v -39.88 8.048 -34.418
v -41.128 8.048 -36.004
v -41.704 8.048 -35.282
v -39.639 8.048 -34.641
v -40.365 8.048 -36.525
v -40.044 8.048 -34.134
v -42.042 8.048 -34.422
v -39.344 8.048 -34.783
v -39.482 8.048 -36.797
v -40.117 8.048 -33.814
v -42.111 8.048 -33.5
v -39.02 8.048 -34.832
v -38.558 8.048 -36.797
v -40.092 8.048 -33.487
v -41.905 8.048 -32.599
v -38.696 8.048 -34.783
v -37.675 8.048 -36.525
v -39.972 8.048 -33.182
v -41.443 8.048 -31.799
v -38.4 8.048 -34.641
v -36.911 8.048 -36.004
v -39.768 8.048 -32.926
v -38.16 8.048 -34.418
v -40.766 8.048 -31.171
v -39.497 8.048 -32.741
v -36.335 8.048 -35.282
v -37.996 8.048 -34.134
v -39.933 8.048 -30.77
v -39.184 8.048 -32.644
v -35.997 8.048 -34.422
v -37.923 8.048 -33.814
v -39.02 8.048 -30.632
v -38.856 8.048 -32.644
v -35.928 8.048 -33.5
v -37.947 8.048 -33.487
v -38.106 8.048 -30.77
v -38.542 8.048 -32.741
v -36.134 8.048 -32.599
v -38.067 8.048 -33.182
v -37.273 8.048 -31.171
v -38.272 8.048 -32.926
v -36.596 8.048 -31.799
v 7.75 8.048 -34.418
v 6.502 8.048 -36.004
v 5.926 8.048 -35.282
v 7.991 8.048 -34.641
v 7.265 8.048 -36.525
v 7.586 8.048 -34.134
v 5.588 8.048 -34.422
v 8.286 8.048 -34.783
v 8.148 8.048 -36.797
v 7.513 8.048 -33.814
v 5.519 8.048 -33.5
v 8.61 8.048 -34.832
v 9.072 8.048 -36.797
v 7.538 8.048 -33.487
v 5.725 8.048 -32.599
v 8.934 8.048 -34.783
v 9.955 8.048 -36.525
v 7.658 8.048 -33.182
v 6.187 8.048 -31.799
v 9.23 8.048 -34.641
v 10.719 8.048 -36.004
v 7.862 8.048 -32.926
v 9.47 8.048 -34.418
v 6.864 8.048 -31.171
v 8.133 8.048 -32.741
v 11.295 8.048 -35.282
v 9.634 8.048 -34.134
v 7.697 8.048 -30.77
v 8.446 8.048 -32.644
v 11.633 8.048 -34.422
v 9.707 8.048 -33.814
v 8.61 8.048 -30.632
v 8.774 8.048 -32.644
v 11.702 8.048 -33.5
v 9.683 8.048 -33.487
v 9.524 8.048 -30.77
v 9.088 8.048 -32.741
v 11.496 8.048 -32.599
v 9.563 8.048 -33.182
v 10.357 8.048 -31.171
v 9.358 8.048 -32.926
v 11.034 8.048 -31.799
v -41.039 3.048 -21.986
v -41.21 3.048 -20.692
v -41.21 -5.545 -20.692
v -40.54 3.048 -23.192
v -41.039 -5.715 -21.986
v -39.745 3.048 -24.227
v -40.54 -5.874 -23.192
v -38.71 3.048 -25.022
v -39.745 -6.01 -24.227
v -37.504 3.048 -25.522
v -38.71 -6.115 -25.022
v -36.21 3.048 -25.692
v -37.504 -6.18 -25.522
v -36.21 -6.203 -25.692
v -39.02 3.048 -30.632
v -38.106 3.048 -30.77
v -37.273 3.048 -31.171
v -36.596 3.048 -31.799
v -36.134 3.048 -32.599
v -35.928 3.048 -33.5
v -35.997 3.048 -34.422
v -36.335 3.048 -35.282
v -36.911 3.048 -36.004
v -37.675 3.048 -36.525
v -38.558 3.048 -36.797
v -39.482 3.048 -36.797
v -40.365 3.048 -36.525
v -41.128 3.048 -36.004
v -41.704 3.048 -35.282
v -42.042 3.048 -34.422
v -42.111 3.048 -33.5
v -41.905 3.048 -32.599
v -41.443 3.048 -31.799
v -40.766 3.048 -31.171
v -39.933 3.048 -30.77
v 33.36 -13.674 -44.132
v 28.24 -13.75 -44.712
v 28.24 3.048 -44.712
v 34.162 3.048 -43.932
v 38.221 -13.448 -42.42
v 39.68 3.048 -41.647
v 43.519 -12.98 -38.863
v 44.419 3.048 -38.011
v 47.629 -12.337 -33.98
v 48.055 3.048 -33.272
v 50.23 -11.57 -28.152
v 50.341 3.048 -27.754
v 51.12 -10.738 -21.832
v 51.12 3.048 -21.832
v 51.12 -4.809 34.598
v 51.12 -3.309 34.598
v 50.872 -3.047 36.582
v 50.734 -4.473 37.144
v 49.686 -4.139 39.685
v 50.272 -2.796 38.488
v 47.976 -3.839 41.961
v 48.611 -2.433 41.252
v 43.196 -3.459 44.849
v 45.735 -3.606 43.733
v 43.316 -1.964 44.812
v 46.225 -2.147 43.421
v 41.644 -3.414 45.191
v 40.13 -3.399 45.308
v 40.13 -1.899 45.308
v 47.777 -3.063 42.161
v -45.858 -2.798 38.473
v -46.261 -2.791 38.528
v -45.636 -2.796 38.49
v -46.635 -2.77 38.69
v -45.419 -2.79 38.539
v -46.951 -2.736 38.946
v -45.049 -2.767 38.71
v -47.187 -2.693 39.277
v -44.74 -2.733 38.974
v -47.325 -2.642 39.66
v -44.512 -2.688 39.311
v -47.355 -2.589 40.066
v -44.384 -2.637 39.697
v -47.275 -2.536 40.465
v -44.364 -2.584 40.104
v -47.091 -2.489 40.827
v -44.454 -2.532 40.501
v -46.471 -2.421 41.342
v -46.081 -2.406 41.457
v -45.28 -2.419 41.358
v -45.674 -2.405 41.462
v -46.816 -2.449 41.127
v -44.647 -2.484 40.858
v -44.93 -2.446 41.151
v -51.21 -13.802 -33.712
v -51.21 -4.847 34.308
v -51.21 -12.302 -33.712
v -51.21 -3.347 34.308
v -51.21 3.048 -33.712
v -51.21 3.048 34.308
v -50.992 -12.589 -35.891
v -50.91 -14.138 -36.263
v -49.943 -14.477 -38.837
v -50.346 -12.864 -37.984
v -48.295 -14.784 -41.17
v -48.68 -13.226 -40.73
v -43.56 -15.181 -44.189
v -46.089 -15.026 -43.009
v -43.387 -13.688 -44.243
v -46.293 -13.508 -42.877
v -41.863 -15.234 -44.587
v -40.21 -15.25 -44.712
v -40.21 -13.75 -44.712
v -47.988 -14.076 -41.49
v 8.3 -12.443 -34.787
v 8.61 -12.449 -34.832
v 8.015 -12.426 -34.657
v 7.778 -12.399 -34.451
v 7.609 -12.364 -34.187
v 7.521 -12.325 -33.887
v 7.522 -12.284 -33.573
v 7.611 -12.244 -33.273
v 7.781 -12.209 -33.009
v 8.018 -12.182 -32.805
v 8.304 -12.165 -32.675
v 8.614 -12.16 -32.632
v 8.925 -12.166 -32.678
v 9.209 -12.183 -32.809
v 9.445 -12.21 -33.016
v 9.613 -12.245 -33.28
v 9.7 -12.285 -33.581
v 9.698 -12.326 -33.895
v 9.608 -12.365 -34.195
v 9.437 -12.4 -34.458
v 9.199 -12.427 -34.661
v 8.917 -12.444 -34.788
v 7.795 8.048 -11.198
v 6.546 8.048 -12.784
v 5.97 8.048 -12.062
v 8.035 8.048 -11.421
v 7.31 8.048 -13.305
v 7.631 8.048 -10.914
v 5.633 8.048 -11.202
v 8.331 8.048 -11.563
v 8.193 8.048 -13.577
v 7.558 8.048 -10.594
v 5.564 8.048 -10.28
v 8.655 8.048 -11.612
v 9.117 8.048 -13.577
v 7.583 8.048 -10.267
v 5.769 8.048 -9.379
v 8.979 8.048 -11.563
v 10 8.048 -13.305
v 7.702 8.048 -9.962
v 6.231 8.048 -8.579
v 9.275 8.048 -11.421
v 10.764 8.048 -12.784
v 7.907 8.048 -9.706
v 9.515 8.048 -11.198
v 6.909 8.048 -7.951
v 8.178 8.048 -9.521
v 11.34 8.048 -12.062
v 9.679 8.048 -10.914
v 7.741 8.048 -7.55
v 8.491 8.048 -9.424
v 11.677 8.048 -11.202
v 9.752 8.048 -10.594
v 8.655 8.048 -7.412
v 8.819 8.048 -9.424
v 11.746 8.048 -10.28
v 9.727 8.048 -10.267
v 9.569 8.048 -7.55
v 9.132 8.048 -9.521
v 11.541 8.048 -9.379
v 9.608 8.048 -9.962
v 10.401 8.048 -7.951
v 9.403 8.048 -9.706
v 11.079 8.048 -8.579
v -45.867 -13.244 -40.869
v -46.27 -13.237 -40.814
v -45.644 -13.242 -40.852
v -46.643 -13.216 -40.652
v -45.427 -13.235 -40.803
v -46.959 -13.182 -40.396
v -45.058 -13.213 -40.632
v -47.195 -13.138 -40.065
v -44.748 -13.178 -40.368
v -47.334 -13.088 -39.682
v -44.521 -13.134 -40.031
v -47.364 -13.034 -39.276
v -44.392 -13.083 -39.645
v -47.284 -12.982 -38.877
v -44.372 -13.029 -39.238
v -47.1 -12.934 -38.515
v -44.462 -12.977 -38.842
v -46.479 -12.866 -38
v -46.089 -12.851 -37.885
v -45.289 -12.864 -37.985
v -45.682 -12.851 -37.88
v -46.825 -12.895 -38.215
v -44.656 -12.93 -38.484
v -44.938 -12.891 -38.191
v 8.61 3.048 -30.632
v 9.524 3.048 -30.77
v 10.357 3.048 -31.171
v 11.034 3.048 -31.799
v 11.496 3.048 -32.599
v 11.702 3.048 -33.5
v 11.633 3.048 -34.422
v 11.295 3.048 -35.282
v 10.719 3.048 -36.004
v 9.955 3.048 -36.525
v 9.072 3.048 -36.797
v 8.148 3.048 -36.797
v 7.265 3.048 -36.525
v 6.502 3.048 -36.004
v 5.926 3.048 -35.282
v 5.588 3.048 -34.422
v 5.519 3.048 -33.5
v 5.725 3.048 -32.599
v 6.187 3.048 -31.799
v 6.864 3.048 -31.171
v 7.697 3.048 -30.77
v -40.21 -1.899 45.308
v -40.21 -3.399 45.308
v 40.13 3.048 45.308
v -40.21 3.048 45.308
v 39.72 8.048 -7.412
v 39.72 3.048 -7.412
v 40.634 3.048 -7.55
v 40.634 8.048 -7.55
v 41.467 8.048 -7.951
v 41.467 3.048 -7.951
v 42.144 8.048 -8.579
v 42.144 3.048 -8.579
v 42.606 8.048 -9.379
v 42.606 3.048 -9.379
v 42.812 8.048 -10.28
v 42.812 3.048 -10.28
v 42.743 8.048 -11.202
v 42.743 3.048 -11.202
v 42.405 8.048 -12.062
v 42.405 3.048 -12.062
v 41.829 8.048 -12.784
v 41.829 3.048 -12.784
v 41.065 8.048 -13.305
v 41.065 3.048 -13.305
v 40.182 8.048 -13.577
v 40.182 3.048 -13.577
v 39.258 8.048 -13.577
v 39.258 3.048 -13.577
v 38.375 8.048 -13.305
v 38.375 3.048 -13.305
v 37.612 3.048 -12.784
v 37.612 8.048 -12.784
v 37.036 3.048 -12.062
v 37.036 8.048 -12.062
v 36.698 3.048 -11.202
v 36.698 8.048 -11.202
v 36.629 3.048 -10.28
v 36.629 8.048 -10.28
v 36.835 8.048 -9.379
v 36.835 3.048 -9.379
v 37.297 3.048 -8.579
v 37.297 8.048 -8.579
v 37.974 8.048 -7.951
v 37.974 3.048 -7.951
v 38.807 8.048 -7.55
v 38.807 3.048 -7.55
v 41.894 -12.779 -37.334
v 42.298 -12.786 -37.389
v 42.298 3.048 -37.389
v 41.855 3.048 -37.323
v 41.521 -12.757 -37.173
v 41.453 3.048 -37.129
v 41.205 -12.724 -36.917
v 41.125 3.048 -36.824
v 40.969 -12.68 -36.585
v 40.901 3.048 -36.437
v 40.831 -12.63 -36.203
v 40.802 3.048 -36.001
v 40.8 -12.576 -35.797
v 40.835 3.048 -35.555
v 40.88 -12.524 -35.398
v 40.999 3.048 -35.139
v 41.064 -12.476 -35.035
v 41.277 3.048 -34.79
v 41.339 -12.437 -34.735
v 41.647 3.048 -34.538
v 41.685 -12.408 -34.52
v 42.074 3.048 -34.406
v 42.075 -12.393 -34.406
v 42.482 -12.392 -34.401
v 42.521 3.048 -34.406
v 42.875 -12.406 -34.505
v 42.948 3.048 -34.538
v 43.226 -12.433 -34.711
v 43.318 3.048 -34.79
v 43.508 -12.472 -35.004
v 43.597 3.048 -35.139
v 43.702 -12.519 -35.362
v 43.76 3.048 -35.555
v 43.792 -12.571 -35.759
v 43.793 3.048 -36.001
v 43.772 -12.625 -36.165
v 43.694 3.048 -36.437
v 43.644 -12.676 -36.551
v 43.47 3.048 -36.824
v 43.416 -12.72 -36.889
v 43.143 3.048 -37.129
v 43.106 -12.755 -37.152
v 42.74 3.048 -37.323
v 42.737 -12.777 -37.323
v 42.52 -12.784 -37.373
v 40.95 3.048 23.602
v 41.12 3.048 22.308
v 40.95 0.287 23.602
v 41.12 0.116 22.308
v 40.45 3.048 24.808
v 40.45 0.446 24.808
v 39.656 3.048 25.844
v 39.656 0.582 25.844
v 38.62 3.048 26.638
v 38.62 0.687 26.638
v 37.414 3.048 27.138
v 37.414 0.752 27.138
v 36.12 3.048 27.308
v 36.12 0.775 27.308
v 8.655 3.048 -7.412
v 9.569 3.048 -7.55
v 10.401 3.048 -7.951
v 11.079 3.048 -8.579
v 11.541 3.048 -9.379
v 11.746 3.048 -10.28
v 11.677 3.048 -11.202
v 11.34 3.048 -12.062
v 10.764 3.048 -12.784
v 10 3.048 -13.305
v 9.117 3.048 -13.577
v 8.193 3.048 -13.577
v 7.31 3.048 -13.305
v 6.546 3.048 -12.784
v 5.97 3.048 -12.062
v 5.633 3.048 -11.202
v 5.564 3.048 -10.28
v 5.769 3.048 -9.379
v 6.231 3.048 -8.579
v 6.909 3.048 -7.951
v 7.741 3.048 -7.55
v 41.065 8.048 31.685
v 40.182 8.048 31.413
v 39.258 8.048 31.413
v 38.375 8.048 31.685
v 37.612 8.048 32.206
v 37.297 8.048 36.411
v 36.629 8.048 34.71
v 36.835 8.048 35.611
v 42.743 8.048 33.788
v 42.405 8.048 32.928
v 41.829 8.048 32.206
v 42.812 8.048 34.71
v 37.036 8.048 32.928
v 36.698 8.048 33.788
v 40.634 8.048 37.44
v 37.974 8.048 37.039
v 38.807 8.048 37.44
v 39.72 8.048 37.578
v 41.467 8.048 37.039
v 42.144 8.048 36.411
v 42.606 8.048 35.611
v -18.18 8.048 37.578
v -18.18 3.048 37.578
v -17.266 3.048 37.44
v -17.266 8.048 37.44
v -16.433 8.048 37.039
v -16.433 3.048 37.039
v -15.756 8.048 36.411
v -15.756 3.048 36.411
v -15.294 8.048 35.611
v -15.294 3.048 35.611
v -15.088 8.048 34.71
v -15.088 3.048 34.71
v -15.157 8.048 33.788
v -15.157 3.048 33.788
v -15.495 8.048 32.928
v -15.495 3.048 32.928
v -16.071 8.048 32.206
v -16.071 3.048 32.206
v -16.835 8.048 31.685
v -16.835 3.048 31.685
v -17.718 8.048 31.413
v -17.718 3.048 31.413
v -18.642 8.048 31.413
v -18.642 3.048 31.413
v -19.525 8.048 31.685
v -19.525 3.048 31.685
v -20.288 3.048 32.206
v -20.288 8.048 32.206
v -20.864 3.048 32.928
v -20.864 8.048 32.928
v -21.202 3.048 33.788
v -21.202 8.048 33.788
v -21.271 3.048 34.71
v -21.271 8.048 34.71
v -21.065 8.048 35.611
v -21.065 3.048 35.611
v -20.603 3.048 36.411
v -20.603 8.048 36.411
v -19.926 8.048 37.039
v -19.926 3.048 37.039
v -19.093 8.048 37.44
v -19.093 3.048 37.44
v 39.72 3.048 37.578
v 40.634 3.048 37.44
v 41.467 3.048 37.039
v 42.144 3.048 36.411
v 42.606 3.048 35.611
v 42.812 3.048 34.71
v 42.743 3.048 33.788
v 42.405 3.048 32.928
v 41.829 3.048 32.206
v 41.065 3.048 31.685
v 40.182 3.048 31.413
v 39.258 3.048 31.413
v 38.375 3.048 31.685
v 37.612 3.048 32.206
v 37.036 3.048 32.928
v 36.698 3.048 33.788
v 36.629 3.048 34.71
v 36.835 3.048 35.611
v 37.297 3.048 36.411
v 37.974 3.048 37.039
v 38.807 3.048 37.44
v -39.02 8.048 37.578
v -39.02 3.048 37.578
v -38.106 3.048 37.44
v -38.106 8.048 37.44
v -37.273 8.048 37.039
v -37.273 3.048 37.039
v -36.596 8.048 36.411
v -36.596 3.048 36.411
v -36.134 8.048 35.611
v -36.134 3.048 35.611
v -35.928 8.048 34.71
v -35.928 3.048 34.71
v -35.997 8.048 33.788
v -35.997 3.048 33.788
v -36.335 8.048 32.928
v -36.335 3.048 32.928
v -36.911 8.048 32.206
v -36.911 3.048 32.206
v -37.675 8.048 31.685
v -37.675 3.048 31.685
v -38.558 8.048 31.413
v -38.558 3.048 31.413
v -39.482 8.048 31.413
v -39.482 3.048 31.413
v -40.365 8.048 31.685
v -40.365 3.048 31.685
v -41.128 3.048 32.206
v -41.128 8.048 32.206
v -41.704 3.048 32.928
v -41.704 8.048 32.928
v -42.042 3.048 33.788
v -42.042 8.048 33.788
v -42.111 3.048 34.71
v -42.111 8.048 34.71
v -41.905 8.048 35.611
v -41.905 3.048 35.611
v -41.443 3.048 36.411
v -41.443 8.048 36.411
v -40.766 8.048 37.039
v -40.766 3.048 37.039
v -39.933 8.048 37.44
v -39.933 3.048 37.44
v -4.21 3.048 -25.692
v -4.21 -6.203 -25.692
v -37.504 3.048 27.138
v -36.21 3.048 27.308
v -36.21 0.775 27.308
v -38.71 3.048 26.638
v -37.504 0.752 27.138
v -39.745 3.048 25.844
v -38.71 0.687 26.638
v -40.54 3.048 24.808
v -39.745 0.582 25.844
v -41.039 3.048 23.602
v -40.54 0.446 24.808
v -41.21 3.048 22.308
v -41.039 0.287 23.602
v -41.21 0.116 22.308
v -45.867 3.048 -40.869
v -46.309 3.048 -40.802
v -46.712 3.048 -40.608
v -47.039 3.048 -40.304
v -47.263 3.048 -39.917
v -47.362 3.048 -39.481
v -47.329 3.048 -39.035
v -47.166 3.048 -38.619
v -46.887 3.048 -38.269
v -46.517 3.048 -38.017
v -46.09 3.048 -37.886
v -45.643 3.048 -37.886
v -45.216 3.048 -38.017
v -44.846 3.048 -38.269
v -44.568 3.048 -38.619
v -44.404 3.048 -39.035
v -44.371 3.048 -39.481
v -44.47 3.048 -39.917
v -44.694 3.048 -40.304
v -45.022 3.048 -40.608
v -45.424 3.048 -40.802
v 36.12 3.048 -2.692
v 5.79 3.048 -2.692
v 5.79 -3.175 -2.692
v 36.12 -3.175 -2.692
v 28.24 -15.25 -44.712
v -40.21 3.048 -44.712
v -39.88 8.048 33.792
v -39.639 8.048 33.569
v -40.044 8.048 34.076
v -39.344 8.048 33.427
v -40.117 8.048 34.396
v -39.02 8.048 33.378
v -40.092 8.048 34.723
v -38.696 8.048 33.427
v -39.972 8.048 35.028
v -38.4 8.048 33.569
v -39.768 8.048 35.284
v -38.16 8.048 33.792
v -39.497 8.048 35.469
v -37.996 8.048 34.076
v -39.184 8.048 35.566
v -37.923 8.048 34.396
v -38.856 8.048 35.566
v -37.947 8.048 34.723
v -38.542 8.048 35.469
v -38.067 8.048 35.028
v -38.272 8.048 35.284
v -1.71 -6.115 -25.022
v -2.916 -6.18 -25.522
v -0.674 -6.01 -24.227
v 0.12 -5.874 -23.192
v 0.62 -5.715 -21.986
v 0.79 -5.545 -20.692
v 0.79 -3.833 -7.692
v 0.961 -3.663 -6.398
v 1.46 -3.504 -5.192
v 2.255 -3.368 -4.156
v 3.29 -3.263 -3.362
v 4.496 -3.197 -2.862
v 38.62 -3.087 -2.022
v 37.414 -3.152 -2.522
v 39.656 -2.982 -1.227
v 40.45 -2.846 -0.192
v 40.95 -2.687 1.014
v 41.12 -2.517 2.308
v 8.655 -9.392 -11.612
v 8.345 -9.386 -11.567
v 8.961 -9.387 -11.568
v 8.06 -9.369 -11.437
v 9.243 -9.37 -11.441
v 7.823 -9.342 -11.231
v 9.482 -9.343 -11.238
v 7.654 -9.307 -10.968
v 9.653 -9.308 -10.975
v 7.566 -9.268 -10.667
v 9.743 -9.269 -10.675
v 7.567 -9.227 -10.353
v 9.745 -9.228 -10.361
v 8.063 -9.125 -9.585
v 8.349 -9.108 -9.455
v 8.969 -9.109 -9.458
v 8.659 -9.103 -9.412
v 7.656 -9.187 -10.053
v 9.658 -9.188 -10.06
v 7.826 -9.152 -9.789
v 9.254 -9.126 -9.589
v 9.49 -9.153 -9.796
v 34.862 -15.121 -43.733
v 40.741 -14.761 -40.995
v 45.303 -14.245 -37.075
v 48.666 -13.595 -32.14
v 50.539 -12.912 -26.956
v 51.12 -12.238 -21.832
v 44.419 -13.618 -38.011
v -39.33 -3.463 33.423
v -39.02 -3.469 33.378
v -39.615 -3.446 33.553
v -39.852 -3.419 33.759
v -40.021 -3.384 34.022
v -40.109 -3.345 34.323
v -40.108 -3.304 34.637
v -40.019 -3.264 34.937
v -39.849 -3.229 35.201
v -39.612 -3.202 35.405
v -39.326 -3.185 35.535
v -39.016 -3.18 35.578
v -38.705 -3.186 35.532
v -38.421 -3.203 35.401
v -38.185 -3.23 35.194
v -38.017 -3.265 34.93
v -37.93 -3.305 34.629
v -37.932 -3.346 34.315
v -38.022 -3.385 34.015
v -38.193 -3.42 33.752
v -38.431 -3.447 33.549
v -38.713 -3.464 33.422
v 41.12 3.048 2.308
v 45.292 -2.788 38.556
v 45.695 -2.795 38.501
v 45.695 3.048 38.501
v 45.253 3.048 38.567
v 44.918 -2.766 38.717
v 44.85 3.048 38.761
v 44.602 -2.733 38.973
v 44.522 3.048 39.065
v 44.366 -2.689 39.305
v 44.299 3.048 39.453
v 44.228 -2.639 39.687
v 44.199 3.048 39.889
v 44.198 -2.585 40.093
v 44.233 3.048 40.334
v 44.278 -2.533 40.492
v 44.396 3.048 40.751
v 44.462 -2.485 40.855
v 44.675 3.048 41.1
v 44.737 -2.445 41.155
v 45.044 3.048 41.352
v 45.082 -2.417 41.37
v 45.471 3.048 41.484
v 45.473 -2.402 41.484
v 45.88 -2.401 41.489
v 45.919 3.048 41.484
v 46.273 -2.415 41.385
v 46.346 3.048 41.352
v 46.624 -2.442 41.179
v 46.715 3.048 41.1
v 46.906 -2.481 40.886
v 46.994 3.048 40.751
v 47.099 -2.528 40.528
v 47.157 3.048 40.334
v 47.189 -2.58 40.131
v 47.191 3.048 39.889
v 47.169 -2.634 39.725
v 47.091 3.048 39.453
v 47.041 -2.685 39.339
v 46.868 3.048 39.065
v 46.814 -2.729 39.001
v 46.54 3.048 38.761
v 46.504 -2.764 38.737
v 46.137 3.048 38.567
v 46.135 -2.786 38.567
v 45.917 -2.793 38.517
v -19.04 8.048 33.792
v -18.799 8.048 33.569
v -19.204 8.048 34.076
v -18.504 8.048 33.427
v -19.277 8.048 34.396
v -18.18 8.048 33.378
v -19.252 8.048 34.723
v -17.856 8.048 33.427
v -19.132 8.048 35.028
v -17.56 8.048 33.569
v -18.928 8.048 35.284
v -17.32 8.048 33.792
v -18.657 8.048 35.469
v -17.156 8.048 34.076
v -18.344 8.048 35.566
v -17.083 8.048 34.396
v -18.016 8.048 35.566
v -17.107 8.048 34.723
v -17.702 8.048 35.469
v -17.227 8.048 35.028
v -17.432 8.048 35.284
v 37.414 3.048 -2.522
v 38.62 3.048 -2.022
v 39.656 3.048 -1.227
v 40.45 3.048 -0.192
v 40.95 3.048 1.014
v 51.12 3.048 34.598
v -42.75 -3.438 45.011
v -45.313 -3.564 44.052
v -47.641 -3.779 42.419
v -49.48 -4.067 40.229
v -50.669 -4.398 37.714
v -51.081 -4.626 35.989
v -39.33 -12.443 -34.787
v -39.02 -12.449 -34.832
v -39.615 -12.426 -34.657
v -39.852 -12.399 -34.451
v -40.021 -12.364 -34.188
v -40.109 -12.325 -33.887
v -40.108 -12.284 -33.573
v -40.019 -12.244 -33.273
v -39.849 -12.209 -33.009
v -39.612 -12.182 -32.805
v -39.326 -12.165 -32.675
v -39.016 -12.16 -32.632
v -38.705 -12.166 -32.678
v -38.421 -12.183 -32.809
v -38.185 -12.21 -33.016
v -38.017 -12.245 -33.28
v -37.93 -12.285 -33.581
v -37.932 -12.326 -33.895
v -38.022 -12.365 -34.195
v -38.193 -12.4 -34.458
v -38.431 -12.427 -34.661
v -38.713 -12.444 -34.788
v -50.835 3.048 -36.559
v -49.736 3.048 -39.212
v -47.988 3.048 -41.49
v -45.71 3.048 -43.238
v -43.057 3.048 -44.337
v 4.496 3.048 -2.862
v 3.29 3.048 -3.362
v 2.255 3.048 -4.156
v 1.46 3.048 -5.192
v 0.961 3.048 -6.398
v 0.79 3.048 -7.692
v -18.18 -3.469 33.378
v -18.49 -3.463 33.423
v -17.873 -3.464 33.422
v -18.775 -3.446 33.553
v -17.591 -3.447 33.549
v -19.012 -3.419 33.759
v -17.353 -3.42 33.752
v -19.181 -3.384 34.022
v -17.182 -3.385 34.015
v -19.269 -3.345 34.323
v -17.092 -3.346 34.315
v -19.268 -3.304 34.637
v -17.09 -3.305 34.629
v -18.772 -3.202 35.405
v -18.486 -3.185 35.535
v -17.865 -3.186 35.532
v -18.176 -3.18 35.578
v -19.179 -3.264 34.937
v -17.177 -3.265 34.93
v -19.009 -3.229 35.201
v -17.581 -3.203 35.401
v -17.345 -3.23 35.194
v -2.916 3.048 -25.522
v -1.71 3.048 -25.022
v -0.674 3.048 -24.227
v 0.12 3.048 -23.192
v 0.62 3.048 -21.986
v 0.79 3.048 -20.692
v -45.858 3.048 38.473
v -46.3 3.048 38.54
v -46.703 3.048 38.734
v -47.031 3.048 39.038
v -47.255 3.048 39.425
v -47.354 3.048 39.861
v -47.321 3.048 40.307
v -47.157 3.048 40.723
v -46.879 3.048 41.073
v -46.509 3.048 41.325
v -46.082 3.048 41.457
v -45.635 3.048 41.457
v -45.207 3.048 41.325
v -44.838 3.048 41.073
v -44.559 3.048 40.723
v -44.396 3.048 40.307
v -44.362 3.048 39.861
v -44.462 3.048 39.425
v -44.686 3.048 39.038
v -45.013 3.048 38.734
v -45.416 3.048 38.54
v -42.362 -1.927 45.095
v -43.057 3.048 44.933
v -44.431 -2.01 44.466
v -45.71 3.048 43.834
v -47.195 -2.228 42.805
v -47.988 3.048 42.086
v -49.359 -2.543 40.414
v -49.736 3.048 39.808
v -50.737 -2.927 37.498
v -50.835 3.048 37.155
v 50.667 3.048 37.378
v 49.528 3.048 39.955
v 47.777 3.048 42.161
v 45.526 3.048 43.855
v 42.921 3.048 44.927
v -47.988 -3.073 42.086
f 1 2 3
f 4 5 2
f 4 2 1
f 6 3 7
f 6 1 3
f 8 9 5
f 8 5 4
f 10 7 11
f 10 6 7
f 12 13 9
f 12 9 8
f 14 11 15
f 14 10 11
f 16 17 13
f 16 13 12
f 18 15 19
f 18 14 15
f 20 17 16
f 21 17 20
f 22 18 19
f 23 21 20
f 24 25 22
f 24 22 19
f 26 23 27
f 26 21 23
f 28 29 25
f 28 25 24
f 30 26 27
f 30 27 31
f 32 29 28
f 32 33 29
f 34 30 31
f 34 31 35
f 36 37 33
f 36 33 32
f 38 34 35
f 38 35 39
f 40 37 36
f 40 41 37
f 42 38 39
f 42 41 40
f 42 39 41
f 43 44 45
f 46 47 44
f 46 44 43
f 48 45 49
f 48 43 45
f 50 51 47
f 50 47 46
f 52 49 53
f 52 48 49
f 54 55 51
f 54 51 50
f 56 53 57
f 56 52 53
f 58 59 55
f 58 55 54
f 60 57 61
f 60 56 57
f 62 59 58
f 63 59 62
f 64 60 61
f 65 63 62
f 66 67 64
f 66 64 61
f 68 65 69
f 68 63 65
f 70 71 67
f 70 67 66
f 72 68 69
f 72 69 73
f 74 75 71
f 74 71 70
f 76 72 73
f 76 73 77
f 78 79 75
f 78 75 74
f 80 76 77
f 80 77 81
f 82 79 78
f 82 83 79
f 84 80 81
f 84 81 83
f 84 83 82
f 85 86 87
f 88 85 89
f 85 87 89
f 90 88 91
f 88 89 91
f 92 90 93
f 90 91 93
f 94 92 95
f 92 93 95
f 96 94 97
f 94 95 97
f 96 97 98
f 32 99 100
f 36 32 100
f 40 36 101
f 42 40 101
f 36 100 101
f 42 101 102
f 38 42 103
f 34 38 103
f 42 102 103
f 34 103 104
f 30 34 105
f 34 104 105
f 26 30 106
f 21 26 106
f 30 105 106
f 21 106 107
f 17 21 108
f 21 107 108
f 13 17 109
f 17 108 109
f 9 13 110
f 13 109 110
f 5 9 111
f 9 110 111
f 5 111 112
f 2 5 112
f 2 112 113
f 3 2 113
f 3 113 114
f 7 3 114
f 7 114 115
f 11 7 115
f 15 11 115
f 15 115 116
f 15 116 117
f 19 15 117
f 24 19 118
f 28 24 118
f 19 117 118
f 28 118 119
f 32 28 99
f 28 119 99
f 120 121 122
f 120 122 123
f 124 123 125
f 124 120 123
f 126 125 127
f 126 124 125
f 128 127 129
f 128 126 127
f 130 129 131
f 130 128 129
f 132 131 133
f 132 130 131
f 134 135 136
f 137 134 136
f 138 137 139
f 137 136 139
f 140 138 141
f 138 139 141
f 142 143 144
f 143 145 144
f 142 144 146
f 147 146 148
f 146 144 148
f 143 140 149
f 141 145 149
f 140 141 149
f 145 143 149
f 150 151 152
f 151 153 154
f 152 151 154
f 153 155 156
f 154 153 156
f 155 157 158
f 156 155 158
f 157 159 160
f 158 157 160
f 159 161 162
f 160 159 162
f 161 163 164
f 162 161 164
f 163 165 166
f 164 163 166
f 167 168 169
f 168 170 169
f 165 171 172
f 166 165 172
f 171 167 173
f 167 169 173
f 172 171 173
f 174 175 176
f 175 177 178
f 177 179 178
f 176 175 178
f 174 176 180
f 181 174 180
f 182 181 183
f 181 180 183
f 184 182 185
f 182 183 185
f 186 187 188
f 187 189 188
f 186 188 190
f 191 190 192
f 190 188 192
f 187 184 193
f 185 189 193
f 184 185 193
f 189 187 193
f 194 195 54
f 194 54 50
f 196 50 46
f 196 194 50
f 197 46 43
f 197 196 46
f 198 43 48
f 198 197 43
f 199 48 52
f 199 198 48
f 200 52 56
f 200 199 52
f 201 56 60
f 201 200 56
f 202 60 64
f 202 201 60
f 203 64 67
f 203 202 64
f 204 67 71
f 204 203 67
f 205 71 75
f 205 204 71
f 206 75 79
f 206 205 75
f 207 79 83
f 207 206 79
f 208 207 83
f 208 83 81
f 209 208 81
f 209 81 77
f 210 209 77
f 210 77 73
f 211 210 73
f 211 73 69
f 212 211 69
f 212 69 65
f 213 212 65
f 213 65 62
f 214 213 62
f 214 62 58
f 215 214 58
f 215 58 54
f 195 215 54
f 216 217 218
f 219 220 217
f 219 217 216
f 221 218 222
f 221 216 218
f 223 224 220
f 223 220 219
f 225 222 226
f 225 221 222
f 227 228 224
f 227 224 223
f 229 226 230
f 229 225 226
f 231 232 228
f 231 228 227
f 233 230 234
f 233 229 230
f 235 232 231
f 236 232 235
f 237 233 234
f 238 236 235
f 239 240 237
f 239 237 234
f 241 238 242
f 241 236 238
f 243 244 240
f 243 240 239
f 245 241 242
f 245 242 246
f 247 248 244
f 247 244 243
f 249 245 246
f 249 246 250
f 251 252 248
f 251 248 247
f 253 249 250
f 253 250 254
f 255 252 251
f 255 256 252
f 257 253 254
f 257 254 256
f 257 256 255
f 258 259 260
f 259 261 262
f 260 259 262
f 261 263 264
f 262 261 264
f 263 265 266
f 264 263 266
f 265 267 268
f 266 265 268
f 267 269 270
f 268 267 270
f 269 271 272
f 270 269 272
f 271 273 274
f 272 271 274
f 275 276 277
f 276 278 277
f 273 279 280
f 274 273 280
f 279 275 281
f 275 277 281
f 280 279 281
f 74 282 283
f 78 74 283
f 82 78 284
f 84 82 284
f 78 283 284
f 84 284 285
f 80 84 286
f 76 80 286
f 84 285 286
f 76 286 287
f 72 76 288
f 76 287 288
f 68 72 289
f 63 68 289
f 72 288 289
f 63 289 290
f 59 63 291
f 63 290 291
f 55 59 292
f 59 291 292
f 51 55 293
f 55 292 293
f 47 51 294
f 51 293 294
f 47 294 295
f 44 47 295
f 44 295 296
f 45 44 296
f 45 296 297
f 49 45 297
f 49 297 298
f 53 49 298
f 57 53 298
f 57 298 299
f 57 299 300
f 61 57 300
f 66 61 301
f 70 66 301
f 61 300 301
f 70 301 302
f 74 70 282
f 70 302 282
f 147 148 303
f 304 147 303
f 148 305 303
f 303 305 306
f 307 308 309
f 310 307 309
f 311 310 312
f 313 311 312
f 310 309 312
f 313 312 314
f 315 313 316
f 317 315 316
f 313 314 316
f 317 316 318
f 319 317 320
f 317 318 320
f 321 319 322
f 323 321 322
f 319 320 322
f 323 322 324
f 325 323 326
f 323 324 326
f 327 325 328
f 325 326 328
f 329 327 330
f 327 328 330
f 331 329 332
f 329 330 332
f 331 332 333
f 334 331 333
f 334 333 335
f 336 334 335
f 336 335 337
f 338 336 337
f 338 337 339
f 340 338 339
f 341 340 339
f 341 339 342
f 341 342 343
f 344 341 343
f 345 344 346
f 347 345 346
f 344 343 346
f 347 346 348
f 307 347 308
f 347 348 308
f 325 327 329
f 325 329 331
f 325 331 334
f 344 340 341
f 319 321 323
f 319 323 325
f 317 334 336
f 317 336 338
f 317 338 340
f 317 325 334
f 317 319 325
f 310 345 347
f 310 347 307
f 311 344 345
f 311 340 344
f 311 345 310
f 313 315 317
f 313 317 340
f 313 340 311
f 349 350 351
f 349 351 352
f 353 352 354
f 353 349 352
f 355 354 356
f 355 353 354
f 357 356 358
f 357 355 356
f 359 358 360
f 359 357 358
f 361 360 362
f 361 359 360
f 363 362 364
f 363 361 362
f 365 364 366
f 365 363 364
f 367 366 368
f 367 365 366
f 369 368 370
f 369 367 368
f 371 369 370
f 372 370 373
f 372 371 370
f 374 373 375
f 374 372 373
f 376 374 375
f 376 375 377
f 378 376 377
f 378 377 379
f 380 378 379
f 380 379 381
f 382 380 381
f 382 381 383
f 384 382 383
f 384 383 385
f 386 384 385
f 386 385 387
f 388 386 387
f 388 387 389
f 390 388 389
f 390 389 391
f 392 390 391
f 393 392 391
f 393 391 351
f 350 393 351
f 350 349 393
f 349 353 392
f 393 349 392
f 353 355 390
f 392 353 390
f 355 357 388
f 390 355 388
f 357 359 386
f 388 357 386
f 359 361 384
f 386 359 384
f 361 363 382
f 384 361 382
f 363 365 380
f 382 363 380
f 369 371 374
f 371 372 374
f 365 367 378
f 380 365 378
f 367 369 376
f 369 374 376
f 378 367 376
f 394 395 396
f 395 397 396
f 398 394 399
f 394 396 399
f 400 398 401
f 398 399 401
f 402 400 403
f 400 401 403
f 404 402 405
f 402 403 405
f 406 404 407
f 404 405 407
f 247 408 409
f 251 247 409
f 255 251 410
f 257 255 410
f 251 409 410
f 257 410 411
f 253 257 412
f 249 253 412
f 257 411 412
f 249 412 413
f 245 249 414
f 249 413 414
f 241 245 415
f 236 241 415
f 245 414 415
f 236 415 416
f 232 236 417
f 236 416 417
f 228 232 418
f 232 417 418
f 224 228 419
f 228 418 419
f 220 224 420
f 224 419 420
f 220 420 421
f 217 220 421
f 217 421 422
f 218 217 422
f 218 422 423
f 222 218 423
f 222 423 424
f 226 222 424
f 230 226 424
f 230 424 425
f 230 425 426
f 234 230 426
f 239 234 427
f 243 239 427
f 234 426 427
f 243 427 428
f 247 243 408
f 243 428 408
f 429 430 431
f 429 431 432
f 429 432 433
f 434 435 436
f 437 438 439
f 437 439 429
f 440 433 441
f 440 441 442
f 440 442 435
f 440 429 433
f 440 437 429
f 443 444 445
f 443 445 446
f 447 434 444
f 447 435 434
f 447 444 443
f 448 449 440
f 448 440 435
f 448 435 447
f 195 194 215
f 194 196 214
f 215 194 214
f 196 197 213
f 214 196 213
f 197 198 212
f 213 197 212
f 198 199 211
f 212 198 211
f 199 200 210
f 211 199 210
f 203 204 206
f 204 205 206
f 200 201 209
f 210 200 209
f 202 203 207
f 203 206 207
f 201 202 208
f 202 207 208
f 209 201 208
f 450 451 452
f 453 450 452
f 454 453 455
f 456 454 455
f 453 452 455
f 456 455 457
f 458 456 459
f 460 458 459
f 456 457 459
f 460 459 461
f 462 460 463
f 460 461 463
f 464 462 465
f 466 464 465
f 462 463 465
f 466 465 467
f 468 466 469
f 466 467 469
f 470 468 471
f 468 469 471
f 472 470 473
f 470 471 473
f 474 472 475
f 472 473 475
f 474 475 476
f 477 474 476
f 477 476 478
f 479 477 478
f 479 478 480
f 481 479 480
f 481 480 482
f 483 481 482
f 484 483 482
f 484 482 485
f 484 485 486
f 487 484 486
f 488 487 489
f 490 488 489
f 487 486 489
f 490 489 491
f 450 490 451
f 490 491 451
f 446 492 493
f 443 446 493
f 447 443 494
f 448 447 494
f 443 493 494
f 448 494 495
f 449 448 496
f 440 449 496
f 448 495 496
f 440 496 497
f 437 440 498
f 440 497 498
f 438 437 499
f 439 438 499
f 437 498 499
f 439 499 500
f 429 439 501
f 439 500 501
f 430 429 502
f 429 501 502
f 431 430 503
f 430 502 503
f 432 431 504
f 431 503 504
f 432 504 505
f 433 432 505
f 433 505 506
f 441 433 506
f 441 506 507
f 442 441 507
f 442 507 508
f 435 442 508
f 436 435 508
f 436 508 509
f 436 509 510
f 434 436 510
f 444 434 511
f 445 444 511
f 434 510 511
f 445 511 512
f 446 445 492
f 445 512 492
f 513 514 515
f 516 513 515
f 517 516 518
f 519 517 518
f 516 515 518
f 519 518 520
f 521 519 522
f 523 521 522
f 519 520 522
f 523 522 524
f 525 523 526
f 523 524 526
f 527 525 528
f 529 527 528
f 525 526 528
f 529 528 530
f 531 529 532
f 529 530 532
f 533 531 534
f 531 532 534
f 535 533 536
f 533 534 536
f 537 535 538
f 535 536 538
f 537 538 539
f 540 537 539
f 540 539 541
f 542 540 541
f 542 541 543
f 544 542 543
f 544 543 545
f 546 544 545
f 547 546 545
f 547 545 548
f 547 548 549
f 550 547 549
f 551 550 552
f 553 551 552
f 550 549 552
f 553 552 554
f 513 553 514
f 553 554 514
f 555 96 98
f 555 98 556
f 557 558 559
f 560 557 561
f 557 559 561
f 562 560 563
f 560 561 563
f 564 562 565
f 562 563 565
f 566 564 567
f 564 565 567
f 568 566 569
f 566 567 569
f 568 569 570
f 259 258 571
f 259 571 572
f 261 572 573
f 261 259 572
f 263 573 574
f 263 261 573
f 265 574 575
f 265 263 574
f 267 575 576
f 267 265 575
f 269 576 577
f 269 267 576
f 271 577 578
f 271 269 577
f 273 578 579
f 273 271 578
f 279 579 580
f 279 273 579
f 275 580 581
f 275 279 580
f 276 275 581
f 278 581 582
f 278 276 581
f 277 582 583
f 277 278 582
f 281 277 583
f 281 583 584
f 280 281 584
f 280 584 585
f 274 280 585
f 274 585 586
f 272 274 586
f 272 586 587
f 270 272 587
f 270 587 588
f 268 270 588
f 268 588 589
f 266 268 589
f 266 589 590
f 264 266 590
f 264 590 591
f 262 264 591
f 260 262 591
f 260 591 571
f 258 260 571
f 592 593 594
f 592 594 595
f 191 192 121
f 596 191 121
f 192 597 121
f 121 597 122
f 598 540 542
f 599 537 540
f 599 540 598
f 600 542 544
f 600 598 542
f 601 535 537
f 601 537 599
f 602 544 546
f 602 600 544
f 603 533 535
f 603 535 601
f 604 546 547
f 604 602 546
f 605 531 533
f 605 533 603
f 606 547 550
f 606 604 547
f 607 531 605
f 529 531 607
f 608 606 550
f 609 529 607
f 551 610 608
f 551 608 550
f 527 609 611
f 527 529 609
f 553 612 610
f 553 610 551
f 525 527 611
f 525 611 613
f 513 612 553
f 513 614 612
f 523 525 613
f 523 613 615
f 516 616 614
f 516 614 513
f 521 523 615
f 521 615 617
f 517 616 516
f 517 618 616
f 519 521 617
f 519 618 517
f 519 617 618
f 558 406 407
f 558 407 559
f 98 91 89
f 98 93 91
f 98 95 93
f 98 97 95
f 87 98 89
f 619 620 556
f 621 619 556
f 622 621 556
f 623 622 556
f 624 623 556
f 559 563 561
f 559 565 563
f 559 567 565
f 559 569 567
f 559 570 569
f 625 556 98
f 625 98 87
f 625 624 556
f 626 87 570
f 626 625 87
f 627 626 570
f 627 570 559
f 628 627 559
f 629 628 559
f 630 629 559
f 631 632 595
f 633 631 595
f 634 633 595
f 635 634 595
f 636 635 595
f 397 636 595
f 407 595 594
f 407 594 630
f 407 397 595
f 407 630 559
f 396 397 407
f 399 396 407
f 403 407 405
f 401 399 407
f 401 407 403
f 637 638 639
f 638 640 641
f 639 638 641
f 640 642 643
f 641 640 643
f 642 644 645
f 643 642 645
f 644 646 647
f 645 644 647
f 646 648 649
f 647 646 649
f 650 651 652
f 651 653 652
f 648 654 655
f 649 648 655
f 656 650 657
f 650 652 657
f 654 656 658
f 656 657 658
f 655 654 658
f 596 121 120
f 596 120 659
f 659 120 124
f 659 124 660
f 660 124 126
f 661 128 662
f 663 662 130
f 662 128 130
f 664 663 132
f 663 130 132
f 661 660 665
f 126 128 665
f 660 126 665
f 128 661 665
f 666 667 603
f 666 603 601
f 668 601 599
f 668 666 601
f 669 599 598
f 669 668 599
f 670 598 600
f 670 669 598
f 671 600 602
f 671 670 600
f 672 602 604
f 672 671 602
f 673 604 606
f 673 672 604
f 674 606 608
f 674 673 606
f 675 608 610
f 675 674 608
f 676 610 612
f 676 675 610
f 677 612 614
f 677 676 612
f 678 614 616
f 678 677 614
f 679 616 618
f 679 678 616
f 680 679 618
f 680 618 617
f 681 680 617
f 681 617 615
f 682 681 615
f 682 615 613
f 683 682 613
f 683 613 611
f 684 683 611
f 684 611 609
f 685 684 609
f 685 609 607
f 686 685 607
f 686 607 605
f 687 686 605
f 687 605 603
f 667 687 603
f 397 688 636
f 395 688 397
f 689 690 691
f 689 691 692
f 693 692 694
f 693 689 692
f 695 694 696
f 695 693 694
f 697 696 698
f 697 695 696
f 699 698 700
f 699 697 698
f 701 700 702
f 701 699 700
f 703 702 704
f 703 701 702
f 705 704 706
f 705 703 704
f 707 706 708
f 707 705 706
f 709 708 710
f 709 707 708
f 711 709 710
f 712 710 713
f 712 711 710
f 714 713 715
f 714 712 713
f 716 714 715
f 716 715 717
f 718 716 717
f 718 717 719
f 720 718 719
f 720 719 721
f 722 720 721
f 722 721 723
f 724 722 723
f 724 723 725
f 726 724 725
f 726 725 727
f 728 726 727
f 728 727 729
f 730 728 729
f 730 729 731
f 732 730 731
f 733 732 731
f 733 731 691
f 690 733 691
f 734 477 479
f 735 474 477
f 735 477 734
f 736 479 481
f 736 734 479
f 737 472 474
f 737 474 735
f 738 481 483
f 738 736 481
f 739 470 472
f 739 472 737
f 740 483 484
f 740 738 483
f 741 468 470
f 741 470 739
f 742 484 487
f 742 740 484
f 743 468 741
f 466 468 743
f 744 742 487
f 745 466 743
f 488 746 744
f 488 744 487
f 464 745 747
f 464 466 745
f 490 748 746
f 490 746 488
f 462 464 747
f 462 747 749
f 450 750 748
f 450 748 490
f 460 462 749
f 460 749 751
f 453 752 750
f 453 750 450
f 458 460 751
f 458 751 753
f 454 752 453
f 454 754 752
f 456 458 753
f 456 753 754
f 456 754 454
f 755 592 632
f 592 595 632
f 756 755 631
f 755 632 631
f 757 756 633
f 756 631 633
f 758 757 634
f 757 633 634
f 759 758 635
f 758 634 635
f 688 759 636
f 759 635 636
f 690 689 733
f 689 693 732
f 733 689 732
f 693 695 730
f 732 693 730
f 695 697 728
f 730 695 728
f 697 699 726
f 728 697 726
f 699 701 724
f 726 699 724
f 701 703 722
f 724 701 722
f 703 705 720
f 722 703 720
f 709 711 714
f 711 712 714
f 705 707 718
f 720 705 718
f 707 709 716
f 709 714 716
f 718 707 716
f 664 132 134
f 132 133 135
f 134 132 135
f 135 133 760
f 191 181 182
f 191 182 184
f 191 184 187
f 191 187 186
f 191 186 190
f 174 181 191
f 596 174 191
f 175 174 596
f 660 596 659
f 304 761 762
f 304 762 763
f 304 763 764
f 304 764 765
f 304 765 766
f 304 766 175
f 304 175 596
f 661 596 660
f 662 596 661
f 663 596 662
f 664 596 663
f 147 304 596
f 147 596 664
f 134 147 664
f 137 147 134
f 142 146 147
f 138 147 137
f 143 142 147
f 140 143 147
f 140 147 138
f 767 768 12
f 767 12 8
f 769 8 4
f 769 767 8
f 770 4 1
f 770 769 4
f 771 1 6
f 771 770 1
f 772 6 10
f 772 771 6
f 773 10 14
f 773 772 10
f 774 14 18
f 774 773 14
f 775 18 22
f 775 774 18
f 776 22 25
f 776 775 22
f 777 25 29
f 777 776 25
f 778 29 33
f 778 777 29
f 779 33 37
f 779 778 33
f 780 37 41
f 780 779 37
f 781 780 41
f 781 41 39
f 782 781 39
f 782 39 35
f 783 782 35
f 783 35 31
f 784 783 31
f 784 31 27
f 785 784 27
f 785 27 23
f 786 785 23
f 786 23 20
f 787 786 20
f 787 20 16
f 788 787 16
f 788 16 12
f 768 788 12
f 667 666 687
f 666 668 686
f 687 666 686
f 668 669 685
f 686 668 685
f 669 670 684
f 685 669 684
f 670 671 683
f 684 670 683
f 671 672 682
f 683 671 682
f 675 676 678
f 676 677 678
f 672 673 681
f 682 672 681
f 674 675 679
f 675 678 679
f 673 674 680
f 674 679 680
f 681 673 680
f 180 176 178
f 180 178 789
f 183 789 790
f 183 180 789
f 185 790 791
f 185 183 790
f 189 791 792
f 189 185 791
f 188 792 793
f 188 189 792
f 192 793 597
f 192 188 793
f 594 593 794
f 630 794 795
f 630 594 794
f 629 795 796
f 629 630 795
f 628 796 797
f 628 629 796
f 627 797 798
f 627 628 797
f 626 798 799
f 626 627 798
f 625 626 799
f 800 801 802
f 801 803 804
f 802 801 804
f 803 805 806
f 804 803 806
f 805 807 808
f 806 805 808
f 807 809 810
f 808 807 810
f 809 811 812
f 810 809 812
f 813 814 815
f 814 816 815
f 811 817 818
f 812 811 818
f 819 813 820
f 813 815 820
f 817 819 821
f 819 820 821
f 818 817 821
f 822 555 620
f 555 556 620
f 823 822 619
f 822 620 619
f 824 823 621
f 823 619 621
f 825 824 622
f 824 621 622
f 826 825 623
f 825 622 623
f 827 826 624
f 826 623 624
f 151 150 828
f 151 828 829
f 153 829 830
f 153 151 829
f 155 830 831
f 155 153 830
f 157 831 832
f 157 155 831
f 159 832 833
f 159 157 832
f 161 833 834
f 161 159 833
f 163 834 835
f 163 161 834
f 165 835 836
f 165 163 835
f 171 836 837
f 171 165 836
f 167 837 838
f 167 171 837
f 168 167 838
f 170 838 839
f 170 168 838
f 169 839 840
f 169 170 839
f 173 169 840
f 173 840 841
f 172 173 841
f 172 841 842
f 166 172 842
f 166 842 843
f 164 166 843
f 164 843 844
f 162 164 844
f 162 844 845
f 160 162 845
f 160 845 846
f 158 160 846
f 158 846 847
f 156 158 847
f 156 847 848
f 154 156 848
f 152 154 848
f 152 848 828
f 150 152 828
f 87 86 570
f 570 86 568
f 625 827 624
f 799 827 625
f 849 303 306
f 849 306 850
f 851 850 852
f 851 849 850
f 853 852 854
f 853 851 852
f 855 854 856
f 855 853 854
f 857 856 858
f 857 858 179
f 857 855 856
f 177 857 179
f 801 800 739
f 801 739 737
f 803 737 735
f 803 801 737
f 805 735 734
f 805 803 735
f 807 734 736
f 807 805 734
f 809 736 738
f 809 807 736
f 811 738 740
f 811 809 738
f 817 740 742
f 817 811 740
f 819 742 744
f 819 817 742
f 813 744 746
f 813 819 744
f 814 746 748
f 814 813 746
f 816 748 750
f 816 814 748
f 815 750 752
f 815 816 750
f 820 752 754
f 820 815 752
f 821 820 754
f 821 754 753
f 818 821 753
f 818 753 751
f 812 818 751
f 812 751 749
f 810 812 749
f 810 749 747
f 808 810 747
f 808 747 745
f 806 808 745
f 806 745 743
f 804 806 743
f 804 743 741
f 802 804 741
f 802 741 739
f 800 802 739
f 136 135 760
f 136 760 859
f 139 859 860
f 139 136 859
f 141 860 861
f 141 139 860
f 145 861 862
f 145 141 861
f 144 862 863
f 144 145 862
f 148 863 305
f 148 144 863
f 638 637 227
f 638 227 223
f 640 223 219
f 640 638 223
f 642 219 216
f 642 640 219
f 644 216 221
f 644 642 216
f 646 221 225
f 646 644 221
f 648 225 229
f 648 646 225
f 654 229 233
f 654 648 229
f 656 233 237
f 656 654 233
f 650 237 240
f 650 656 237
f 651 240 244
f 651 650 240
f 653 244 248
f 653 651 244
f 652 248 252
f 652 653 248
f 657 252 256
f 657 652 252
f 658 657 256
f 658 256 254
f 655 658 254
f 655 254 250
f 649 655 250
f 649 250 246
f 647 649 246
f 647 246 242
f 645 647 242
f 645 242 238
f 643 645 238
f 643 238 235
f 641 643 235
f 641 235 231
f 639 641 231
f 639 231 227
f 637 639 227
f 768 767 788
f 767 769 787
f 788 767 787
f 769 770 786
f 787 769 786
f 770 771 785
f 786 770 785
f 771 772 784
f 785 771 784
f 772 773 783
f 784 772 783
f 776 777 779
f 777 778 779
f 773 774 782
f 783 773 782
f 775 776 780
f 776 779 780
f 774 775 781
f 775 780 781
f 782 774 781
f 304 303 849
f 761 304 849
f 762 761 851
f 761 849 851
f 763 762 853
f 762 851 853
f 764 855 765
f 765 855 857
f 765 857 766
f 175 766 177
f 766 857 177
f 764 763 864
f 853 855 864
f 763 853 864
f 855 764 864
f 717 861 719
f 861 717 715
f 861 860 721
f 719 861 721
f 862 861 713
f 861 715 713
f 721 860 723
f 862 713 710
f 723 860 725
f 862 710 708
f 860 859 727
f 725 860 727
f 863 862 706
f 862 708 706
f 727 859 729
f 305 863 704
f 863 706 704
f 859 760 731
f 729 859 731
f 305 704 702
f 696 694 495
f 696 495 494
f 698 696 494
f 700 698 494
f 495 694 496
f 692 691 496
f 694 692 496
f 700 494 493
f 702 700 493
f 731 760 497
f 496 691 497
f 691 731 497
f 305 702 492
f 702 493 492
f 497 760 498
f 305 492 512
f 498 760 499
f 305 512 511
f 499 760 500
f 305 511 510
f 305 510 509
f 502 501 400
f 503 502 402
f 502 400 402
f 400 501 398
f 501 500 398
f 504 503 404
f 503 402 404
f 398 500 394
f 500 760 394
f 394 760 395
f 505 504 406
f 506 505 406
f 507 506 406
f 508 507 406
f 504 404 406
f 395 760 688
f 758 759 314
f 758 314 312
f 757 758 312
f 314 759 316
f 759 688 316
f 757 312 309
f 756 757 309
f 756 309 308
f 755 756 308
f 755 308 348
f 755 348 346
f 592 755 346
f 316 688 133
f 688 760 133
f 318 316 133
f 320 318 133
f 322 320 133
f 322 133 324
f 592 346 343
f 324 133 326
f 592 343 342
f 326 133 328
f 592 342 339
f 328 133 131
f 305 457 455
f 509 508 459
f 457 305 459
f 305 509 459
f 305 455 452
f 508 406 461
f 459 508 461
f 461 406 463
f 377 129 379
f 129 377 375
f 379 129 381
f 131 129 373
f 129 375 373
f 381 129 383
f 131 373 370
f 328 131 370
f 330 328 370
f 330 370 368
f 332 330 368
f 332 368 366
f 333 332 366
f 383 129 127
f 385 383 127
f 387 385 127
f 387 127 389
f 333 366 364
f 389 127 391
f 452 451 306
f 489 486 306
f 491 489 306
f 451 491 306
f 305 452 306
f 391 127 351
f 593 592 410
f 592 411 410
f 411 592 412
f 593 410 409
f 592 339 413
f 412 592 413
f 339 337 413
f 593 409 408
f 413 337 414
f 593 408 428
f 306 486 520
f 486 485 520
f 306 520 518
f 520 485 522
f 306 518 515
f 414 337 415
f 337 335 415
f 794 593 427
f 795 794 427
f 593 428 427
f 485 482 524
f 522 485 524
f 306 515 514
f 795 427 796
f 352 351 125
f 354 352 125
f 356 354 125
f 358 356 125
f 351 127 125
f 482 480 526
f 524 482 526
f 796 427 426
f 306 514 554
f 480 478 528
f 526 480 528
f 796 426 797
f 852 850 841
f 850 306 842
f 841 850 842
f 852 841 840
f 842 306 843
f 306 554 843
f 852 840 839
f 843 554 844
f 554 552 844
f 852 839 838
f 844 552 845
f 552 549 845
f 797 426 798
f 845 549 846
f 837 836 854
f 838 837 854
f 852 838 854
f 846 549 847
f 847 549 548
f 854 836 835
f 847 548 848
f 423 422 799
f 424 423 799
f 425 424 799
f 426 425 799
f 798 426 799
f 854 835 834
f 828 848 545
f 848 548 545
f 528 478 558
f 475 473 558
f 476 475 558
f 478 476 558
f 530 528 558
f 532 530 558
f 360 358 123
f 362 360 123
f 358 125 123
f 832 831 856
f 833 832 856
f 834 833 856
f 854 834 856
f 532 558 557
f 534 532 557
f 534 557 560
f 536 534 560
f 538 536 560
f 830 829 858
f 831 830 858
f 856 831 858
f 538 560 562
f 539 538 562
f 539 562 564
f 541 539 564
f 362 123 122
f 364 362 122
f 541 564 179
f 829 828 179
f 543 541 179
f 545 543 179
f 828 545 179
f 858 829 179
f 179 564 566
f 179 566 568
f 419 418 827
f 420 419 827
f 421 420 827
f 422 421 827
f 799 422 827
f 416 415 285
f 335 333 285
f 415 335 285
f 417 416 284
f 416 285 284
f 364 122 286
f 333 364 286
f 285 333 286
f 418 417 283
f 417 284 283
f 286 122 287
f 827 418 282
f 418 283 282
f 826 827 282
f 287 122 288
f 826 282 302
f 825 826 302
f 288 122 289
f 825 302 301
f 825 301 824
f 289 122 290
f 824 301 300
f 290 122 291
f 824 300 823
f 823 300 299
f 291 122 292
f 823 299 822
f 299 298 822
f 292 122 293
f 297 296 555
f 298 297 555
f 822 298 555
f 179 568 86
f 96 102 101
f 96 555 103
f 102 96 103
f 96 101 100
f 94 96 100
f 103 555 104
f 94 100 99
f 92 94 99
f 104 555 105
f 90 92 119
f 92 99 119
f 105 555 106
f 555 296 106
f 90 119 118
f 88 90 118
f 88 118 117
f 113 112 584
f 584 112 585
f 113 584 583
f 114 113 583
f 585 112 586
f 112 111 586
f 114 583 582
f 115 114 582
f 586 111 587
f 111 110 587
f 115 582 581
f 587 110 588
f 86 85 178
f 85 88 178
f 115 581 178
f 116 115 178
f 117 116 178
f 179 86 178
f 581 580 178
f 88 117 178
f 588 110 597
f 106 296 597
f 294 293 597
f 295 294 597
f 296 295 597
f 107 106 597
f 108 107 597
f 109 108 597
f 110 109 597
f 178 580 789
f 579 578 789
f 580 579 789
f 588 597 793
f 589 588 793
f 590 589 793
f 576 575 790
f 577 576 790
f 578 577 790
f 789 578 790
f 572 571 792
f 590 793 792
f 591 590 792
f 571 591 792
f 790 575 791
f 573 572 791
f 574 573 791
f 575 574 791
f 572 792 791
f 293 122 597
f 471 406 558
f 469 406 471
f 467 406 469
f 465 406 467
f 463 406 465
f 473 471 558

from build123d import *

# Parameters (mm, degrees)
SKETCH1_R                        = 1.1
SKETCH1_R_2                      = 1.5
BOSS_EXTRUDE1_DEPTH              = 3.048
SKETCH2_R                        = 3.1
SKETCH2_R_2                      = 1.1
BOSS_EXTRUDE2_DEPTH              = 5
BOSS_EXTRUDE4_START              = -13.75
SKETCH1_5_R                      = 1.1
SKETCH1_5_R_2                    = 1.5
BOSS_EXTRUDE4_DEPTH              = 13.75
CUT_EXTRUDE1_DEPTH               = 113.753315675
CUT_EXTRUDE2_REACH               = 77.409
CUT_EXTRUDE2_OFFSET_FROM_SURFACE = 5
FILLET1_R                        = 5
BOSS_EXTRUDE6_DEPTH              = 1.5


with BuildPart() as part:
    # Sketch1 → Boss-Extrude1 (new body)
    with BuildSketch(Plane(origin=(0, 0, 0), x_dir=(1, 0, 0), z_dir=(0, 1, 0))):
        with BuildLine():
            Line((-40.209744398, 44.711958299), (28.240255602, 44.711958299))
            ThreePointArc((28.240255602, 44.711958299), (44.41885963, 38.010560578), (51.120255602, 21.831955824))
            Line((51.120255602, 21.831955824), (51.120255602, -34.598189146))
            ThreePointArc((51.120255602, -34.598189146), (47.776738906, -42.160841434), (40.130306185, -45.308043388))
            Line((40.130306185, -45.308043388), (-40.209744398, -45.308043388))
            ThreePointArc((-40.209744398, -45.308043388), (-47.987919588, -42.086217385), (-51.209744398, -34.308041701))
            Line((-51.209744398, -34.308041701), (-51.209744398, 33.711958299))
            ThreePointArc((-51.209744398, 33.711958299), (-47.987918991, 41.490132892), (-40.209744398, 44.711958299))
        make_face()
        with Locations((-39.019744398, -34.478043388)):
            Circle(SKETCH1_R, mode=Mode.SUBTRACT)
        with Locations((-18.179744398, -34.478043388)):
            Circle(SKETCH1_R, mode=Mode.SUBTRACT)
        with Locations((-39.019744398, 33.731958299)):
            Circle(SKETCH1_R, mode=Mode.SUBTRACT)
        with Locations((8.610255602, 33.731915189)):
            Circle(SKETCH1_R, mode=Mode.SUBTRACT)
        with Locations((8.655, 10.511958299)):
            Circle(SKETCH1_R, mode=Mode.SUBTRACT)
        with Locations((-45.866598648, 39.368812549)):
            Circle(SKETCH1_R_2, mode=Mode.SUBTRACT)
        with Locations((42.297539172, 35.889240349)):
            Circle(SKETCH1_R_2, mode=Mode.SUBTRACT)
        with Locations((45.695011225, -40.000653974)):
            Circle(SKETCH1_R_2, mode=Mode.SUBTRACT)
        with Locations((-45.858259021, -39.973270185)):
            Circle(SKETCH1_R_2, mode=Mode.SUBTRACT)
    extrude(amount=BOSS_EXTRUDE1_DEPTH)

    # Sketch2 → Boss-Extrude2 (add)
    # profile 1 of 7: a face of its own
    with BuildSketch(Plane(origin=(0, 3.048, 0), x_dir=(1, 0, 0), z_dir=(0, 1, 0))):
        with Locations((-39.019744398, 33.731958299)):
            Circle(SKETCH2_R)
        with Locations((-39.019744398, 33.731958299)):
            Circle(SKETCH2_R_2, mode=Mode.SUBTRACT)
    # profile 2 of 7: a face of its own
    with BuildSketch(Plane(origin=(0, 3.048, 0), x_dir=(1, 0, 0), z_dir=(0, 1, 0))):
        with Locations((8.610255602, 33.731915189)):
            Circle(SKETCH2_R)
        with Locations((8.610255602, 33.731915189)):
            Circle(SKETCH2_R_2, mode=Mode.SUBTRACT)
    # profile 3 of 7: a face of its own
    with BuildSketch(Plane(origin=(0, 3.048, 0), x_dir=(1, 0, 0), z_dir=(0, 1, 0))):
        with Locations((8.655, 10.511958299)):
            Circle(SKETCH2_R)
        with Locations((8.655, 10.511958299)):
            Circle(SKETCH2_R_2, mode=Mode.SUBTRACT)
    # profile 4 of 7: a face of its own
    with BuildSketch(Plane(origin=(0, 3.048, 0), x_dir=(1, 0, 0), z_dir=(0, 1, 0))):
        with Locations((-18.179744398, -34.478043388)):
            Circle(SKETCH2_R)
        with Locations((-18.179744398, -34.478043388)):
            Circle(SKETCH2_R_2, mode=Mode.SUBTRACT)
    # profile 5 of 7: a face of its own
    with BuildSketch(Plane(origin=(0, 3.048, 0), x_dir=(1, 0, 0), z_dir=(0, 1, 0))):
        with Locations((-39.019744398, -34.478043388)):
            Circle(SKETCH2_R)
        with Locations((-39.019744398, -34.478043388)):
            Circle(SKETCH2_R_2, mode=Mode.SUBTRACT)
    # profile 6 of 7: a face of its own
    with BuildSketch(Plane(origin=(0, 3.048, 0), x_dir=(1, 0, 0), z_dir=(0, 1, 0))):
        with Locations((39.720255602, -34.478043388)):
            Circle(SKETCH2_R)
    # profile 7 of 7: a face of its own
    with BuildSketch(Plane(origin=(0, 3.048, 0), x_dir=(1, 0, 0), z_dir=(0, 1, 0))):
        with Locations((39.720255602, 10.511958299)):
            Circle(SKETCH2_R)
    extrude(amount=BOSS_EXTRUDE2_DEPTH)

    # Sketch1<5> → Boss-Extrude4 (add)
    with BuildSketch(Plane(origin=(0, 0, 0), x_dir=(1, 0, 0), z_dir=(0, 1, 0)).offset(BOSS_EXTRUDE4_START)):
        with BuildLine():
            Line((-40.209744398, 44.711958299), (28.240255602, 44.711958299))
            ThreePointArc((28.240255602, 44.711958299), (44.41885963, 38.010560578), (51.120255602, 21.831955824))
            Line((51.120255602, 21.831955824), (51.120255602, -34.598189146))
            ThreePointArc((51.120255602, -34.598189146), (47.776738906, -42.160841434), (40.130306185, -45.308043388))
            Line((40.130306185, -45.308043388), (-40.209744398, -45.308043388))
            ThreePointArc((-40.209744398, -45.308043388), (-47.987919588, -42.086217385), (-51.209744398, -34.308041701))
            Line((-51.209744398, -34.308041701), (-51.209744398, 33.711958299))
            ThreePointArc((-51.209744398, 33.711958299), (-47.987918991, 41.490132892), (-40.209744398, 44.711958299))
        make_face()
        with Locations((-39.019744398, -34.478043388)):
            Circle(SKETCH1_5_R, mode=Mode.SUBTRACT)
        with Locations((-18.179744398, -34.478043388)):
            Circle(SKETCH1_5_R, mode=Mode.SUBTRACT)
        with Locations((-39.019744398, 33.731958299)):
            Circle(SKETCH1_5_R, mode=Mode.SUBTRACT)
        with Locations((8.610255602, 33.731915189)):
            Circle(SKETCH1_5_R, mode=Mode.SUBTRACT)
        with Locations((8.655, 10.511958299)):
            Circle(SKETCH1_5_R, mode=Mode.SUBTRACT)
        with Locations((-45.866598648, 39.368812549)):
            Circle(SKETCH1_5_R_2, mode=Mode.SUBTRACT)
        with Locations((42.297539172, 35.889240349)):
            Circle(SKETCH1_5_R_2, mode=Mode.SUBTRACT)
        with Locations((45.695011225, -40.000653974)):
            Circle(SKETCH1_5_R_2, mode=Mode.SUBTRACT)
        with Locations((-45.858259021, -39.973270185)):
            Circle(SKETCH1_5_R_2, mode=Mode.SUBTRACT)
    extrude(amount=BOSS_EXTRUDE4_DEPTH)

    # Sketch3 → Cut-Extrude1 (cut, through all)
    with BuildSketch(Plane.ZY.offset(51.209744398)):
        Polygon((-44.711958299, -13.75), (-33.711958299, -13.75), (34.308041701, -13.75), (45.308043388, -13.75), (45.308043388, -1.898641945), align=None)
    extrude(amount=-CUT_EXTRUDE1_DEPTH, mode=Mode.SUBTRACT)

    # Cut-Extrude2: up to this face of the body (flat: up to its plane, moved by the offset)
    cut_extrude2_end = Plane(part.part.faces().sort_by_distance((-0.446052123, -7.774765631, 0.674452735))[0]).offset(-CUT_EXTRUDE2_OFFSET_FROM_SURFACE)
    # Sketch4 → Cut-Extrude2 (cut, up to the picked face)
    with BuildSketch(Plane(origin=(0, 3.048, 0), x_dir=(1, 0, 0), z_dir=(0, 1, 0)), mode=Mode.PRIVATE) as cut_extrude2_sk1:
        Polygon((0.790255602, 2.691956612), (41.120255602, 2.691956612), (41.120255602, -27.308043388), (-41.209744398, -27.308043388), (-41.209744398, 2.691956612), (-41.209744398, 25.691956612), (0.790255602, 25.691956612), align=None)
    cut_extrude2_tool1 = split(extrude(cut_extrude2_sk1.sketch, amount=-CUT_EXTRUDE2_REACH, mode=Mode.PRIVATE), bisect_by=cut_extrude2_end, keep=Keep.BOTH, mode=Mode.PRIVATE)
    add(cut_extrude2_tool1.solids().sort_by(Axis((-5.714115, 3.048, 4.857594), (0, -1, 0)))[0], mode=Mode.SUBTRACT)

    # Fillet1
    fillet1_edges = [part.edges().sort_by_distance(p)[0] for p in [
        (41.120255602, 1.911378951, 27.308043388),
        (-41.209744398, 1.911378951, 27.308043388),
        (-41.209744398, -1.577412235, -25.691956612),
        (0.790255602, -1.577412235, -25.691956612),
        (41.120255602, -0.063408513, -2.691956612),
        (0.790255602, -0.063408513, -2.691956612),
    ]]
    fillet(fillet1_edges, radius=FILLET1_R)

    # Sketch5 → Boss-Extrude6 (add, along a direction that is not the sketch's normal)
    with BuildSketch(Plane(origin=(0, -7.72958688, 1.017619418), x_dir=(1, 0, 0), z_dir=(0, -0.9914448613738103, 0.13052619222005257))):
        with BuildLine():
            Line((-51.209744398, 33.577685726), (-51.209744398, -35.029257874))
            add(Edge.make_bspline(
                [(-51.209744398, -35.029257874), (-51.209744398, -46.124176441), (-40.209744398, -46.124176441)],
                knots=[4.71238898, 4.71238898, 4.71238898, 6.283185307, 6.283185307, 6.283185307], degree=2, weights=[1, 0.707106781, 1]))
            Line((-40.209744398, -46.124176441), (28.240255602, -46.124176441))
            add(Edge.make_bspline(
                [(28.240255602, -46.124176441), (51.120255602, -46.124176441), (51.120255602, -23.046745823)],
                knots=[0, 0, 0, 1.570796327, 1.570796327, 1.570796327], degree=2, weights=[1, 0.707106781, 1]))
            Line((51.120255602, -23.046745823), (51.120255602, 33.87033514))
            add(Edge.make_bspline(
                [(51.120255602, 33.87033514), (50.756477038, 44.58229707), (40.130306185, 44.672604293)],
                knots=[1.605036011, 1.605036011, 1.605036011, 3.133166993, 3.133166993, 3.133166993], degree=2, weights=[1, 0.722029225, 1]))
            Line((40.130306185, 44.672604293), (-40.209744398, 44.672604293))
            add(Edge.make_bspline(
                [(-40.209744398, 44.672604293), (-51.209744398, 44.672604293), (-51.209744398, 33.577685726)],
                knots=[3.141592654, 3.141592654, 3.141592654, 4.71238898, 4.71238898, 4.71238898], degree=2, weights=[1, 0.707106781, 1]))
        make_face()
    extrude(amount=BOSS_EXTRUDE6_DEPTH, dir=(0, -1, 0))


solid = part.part
